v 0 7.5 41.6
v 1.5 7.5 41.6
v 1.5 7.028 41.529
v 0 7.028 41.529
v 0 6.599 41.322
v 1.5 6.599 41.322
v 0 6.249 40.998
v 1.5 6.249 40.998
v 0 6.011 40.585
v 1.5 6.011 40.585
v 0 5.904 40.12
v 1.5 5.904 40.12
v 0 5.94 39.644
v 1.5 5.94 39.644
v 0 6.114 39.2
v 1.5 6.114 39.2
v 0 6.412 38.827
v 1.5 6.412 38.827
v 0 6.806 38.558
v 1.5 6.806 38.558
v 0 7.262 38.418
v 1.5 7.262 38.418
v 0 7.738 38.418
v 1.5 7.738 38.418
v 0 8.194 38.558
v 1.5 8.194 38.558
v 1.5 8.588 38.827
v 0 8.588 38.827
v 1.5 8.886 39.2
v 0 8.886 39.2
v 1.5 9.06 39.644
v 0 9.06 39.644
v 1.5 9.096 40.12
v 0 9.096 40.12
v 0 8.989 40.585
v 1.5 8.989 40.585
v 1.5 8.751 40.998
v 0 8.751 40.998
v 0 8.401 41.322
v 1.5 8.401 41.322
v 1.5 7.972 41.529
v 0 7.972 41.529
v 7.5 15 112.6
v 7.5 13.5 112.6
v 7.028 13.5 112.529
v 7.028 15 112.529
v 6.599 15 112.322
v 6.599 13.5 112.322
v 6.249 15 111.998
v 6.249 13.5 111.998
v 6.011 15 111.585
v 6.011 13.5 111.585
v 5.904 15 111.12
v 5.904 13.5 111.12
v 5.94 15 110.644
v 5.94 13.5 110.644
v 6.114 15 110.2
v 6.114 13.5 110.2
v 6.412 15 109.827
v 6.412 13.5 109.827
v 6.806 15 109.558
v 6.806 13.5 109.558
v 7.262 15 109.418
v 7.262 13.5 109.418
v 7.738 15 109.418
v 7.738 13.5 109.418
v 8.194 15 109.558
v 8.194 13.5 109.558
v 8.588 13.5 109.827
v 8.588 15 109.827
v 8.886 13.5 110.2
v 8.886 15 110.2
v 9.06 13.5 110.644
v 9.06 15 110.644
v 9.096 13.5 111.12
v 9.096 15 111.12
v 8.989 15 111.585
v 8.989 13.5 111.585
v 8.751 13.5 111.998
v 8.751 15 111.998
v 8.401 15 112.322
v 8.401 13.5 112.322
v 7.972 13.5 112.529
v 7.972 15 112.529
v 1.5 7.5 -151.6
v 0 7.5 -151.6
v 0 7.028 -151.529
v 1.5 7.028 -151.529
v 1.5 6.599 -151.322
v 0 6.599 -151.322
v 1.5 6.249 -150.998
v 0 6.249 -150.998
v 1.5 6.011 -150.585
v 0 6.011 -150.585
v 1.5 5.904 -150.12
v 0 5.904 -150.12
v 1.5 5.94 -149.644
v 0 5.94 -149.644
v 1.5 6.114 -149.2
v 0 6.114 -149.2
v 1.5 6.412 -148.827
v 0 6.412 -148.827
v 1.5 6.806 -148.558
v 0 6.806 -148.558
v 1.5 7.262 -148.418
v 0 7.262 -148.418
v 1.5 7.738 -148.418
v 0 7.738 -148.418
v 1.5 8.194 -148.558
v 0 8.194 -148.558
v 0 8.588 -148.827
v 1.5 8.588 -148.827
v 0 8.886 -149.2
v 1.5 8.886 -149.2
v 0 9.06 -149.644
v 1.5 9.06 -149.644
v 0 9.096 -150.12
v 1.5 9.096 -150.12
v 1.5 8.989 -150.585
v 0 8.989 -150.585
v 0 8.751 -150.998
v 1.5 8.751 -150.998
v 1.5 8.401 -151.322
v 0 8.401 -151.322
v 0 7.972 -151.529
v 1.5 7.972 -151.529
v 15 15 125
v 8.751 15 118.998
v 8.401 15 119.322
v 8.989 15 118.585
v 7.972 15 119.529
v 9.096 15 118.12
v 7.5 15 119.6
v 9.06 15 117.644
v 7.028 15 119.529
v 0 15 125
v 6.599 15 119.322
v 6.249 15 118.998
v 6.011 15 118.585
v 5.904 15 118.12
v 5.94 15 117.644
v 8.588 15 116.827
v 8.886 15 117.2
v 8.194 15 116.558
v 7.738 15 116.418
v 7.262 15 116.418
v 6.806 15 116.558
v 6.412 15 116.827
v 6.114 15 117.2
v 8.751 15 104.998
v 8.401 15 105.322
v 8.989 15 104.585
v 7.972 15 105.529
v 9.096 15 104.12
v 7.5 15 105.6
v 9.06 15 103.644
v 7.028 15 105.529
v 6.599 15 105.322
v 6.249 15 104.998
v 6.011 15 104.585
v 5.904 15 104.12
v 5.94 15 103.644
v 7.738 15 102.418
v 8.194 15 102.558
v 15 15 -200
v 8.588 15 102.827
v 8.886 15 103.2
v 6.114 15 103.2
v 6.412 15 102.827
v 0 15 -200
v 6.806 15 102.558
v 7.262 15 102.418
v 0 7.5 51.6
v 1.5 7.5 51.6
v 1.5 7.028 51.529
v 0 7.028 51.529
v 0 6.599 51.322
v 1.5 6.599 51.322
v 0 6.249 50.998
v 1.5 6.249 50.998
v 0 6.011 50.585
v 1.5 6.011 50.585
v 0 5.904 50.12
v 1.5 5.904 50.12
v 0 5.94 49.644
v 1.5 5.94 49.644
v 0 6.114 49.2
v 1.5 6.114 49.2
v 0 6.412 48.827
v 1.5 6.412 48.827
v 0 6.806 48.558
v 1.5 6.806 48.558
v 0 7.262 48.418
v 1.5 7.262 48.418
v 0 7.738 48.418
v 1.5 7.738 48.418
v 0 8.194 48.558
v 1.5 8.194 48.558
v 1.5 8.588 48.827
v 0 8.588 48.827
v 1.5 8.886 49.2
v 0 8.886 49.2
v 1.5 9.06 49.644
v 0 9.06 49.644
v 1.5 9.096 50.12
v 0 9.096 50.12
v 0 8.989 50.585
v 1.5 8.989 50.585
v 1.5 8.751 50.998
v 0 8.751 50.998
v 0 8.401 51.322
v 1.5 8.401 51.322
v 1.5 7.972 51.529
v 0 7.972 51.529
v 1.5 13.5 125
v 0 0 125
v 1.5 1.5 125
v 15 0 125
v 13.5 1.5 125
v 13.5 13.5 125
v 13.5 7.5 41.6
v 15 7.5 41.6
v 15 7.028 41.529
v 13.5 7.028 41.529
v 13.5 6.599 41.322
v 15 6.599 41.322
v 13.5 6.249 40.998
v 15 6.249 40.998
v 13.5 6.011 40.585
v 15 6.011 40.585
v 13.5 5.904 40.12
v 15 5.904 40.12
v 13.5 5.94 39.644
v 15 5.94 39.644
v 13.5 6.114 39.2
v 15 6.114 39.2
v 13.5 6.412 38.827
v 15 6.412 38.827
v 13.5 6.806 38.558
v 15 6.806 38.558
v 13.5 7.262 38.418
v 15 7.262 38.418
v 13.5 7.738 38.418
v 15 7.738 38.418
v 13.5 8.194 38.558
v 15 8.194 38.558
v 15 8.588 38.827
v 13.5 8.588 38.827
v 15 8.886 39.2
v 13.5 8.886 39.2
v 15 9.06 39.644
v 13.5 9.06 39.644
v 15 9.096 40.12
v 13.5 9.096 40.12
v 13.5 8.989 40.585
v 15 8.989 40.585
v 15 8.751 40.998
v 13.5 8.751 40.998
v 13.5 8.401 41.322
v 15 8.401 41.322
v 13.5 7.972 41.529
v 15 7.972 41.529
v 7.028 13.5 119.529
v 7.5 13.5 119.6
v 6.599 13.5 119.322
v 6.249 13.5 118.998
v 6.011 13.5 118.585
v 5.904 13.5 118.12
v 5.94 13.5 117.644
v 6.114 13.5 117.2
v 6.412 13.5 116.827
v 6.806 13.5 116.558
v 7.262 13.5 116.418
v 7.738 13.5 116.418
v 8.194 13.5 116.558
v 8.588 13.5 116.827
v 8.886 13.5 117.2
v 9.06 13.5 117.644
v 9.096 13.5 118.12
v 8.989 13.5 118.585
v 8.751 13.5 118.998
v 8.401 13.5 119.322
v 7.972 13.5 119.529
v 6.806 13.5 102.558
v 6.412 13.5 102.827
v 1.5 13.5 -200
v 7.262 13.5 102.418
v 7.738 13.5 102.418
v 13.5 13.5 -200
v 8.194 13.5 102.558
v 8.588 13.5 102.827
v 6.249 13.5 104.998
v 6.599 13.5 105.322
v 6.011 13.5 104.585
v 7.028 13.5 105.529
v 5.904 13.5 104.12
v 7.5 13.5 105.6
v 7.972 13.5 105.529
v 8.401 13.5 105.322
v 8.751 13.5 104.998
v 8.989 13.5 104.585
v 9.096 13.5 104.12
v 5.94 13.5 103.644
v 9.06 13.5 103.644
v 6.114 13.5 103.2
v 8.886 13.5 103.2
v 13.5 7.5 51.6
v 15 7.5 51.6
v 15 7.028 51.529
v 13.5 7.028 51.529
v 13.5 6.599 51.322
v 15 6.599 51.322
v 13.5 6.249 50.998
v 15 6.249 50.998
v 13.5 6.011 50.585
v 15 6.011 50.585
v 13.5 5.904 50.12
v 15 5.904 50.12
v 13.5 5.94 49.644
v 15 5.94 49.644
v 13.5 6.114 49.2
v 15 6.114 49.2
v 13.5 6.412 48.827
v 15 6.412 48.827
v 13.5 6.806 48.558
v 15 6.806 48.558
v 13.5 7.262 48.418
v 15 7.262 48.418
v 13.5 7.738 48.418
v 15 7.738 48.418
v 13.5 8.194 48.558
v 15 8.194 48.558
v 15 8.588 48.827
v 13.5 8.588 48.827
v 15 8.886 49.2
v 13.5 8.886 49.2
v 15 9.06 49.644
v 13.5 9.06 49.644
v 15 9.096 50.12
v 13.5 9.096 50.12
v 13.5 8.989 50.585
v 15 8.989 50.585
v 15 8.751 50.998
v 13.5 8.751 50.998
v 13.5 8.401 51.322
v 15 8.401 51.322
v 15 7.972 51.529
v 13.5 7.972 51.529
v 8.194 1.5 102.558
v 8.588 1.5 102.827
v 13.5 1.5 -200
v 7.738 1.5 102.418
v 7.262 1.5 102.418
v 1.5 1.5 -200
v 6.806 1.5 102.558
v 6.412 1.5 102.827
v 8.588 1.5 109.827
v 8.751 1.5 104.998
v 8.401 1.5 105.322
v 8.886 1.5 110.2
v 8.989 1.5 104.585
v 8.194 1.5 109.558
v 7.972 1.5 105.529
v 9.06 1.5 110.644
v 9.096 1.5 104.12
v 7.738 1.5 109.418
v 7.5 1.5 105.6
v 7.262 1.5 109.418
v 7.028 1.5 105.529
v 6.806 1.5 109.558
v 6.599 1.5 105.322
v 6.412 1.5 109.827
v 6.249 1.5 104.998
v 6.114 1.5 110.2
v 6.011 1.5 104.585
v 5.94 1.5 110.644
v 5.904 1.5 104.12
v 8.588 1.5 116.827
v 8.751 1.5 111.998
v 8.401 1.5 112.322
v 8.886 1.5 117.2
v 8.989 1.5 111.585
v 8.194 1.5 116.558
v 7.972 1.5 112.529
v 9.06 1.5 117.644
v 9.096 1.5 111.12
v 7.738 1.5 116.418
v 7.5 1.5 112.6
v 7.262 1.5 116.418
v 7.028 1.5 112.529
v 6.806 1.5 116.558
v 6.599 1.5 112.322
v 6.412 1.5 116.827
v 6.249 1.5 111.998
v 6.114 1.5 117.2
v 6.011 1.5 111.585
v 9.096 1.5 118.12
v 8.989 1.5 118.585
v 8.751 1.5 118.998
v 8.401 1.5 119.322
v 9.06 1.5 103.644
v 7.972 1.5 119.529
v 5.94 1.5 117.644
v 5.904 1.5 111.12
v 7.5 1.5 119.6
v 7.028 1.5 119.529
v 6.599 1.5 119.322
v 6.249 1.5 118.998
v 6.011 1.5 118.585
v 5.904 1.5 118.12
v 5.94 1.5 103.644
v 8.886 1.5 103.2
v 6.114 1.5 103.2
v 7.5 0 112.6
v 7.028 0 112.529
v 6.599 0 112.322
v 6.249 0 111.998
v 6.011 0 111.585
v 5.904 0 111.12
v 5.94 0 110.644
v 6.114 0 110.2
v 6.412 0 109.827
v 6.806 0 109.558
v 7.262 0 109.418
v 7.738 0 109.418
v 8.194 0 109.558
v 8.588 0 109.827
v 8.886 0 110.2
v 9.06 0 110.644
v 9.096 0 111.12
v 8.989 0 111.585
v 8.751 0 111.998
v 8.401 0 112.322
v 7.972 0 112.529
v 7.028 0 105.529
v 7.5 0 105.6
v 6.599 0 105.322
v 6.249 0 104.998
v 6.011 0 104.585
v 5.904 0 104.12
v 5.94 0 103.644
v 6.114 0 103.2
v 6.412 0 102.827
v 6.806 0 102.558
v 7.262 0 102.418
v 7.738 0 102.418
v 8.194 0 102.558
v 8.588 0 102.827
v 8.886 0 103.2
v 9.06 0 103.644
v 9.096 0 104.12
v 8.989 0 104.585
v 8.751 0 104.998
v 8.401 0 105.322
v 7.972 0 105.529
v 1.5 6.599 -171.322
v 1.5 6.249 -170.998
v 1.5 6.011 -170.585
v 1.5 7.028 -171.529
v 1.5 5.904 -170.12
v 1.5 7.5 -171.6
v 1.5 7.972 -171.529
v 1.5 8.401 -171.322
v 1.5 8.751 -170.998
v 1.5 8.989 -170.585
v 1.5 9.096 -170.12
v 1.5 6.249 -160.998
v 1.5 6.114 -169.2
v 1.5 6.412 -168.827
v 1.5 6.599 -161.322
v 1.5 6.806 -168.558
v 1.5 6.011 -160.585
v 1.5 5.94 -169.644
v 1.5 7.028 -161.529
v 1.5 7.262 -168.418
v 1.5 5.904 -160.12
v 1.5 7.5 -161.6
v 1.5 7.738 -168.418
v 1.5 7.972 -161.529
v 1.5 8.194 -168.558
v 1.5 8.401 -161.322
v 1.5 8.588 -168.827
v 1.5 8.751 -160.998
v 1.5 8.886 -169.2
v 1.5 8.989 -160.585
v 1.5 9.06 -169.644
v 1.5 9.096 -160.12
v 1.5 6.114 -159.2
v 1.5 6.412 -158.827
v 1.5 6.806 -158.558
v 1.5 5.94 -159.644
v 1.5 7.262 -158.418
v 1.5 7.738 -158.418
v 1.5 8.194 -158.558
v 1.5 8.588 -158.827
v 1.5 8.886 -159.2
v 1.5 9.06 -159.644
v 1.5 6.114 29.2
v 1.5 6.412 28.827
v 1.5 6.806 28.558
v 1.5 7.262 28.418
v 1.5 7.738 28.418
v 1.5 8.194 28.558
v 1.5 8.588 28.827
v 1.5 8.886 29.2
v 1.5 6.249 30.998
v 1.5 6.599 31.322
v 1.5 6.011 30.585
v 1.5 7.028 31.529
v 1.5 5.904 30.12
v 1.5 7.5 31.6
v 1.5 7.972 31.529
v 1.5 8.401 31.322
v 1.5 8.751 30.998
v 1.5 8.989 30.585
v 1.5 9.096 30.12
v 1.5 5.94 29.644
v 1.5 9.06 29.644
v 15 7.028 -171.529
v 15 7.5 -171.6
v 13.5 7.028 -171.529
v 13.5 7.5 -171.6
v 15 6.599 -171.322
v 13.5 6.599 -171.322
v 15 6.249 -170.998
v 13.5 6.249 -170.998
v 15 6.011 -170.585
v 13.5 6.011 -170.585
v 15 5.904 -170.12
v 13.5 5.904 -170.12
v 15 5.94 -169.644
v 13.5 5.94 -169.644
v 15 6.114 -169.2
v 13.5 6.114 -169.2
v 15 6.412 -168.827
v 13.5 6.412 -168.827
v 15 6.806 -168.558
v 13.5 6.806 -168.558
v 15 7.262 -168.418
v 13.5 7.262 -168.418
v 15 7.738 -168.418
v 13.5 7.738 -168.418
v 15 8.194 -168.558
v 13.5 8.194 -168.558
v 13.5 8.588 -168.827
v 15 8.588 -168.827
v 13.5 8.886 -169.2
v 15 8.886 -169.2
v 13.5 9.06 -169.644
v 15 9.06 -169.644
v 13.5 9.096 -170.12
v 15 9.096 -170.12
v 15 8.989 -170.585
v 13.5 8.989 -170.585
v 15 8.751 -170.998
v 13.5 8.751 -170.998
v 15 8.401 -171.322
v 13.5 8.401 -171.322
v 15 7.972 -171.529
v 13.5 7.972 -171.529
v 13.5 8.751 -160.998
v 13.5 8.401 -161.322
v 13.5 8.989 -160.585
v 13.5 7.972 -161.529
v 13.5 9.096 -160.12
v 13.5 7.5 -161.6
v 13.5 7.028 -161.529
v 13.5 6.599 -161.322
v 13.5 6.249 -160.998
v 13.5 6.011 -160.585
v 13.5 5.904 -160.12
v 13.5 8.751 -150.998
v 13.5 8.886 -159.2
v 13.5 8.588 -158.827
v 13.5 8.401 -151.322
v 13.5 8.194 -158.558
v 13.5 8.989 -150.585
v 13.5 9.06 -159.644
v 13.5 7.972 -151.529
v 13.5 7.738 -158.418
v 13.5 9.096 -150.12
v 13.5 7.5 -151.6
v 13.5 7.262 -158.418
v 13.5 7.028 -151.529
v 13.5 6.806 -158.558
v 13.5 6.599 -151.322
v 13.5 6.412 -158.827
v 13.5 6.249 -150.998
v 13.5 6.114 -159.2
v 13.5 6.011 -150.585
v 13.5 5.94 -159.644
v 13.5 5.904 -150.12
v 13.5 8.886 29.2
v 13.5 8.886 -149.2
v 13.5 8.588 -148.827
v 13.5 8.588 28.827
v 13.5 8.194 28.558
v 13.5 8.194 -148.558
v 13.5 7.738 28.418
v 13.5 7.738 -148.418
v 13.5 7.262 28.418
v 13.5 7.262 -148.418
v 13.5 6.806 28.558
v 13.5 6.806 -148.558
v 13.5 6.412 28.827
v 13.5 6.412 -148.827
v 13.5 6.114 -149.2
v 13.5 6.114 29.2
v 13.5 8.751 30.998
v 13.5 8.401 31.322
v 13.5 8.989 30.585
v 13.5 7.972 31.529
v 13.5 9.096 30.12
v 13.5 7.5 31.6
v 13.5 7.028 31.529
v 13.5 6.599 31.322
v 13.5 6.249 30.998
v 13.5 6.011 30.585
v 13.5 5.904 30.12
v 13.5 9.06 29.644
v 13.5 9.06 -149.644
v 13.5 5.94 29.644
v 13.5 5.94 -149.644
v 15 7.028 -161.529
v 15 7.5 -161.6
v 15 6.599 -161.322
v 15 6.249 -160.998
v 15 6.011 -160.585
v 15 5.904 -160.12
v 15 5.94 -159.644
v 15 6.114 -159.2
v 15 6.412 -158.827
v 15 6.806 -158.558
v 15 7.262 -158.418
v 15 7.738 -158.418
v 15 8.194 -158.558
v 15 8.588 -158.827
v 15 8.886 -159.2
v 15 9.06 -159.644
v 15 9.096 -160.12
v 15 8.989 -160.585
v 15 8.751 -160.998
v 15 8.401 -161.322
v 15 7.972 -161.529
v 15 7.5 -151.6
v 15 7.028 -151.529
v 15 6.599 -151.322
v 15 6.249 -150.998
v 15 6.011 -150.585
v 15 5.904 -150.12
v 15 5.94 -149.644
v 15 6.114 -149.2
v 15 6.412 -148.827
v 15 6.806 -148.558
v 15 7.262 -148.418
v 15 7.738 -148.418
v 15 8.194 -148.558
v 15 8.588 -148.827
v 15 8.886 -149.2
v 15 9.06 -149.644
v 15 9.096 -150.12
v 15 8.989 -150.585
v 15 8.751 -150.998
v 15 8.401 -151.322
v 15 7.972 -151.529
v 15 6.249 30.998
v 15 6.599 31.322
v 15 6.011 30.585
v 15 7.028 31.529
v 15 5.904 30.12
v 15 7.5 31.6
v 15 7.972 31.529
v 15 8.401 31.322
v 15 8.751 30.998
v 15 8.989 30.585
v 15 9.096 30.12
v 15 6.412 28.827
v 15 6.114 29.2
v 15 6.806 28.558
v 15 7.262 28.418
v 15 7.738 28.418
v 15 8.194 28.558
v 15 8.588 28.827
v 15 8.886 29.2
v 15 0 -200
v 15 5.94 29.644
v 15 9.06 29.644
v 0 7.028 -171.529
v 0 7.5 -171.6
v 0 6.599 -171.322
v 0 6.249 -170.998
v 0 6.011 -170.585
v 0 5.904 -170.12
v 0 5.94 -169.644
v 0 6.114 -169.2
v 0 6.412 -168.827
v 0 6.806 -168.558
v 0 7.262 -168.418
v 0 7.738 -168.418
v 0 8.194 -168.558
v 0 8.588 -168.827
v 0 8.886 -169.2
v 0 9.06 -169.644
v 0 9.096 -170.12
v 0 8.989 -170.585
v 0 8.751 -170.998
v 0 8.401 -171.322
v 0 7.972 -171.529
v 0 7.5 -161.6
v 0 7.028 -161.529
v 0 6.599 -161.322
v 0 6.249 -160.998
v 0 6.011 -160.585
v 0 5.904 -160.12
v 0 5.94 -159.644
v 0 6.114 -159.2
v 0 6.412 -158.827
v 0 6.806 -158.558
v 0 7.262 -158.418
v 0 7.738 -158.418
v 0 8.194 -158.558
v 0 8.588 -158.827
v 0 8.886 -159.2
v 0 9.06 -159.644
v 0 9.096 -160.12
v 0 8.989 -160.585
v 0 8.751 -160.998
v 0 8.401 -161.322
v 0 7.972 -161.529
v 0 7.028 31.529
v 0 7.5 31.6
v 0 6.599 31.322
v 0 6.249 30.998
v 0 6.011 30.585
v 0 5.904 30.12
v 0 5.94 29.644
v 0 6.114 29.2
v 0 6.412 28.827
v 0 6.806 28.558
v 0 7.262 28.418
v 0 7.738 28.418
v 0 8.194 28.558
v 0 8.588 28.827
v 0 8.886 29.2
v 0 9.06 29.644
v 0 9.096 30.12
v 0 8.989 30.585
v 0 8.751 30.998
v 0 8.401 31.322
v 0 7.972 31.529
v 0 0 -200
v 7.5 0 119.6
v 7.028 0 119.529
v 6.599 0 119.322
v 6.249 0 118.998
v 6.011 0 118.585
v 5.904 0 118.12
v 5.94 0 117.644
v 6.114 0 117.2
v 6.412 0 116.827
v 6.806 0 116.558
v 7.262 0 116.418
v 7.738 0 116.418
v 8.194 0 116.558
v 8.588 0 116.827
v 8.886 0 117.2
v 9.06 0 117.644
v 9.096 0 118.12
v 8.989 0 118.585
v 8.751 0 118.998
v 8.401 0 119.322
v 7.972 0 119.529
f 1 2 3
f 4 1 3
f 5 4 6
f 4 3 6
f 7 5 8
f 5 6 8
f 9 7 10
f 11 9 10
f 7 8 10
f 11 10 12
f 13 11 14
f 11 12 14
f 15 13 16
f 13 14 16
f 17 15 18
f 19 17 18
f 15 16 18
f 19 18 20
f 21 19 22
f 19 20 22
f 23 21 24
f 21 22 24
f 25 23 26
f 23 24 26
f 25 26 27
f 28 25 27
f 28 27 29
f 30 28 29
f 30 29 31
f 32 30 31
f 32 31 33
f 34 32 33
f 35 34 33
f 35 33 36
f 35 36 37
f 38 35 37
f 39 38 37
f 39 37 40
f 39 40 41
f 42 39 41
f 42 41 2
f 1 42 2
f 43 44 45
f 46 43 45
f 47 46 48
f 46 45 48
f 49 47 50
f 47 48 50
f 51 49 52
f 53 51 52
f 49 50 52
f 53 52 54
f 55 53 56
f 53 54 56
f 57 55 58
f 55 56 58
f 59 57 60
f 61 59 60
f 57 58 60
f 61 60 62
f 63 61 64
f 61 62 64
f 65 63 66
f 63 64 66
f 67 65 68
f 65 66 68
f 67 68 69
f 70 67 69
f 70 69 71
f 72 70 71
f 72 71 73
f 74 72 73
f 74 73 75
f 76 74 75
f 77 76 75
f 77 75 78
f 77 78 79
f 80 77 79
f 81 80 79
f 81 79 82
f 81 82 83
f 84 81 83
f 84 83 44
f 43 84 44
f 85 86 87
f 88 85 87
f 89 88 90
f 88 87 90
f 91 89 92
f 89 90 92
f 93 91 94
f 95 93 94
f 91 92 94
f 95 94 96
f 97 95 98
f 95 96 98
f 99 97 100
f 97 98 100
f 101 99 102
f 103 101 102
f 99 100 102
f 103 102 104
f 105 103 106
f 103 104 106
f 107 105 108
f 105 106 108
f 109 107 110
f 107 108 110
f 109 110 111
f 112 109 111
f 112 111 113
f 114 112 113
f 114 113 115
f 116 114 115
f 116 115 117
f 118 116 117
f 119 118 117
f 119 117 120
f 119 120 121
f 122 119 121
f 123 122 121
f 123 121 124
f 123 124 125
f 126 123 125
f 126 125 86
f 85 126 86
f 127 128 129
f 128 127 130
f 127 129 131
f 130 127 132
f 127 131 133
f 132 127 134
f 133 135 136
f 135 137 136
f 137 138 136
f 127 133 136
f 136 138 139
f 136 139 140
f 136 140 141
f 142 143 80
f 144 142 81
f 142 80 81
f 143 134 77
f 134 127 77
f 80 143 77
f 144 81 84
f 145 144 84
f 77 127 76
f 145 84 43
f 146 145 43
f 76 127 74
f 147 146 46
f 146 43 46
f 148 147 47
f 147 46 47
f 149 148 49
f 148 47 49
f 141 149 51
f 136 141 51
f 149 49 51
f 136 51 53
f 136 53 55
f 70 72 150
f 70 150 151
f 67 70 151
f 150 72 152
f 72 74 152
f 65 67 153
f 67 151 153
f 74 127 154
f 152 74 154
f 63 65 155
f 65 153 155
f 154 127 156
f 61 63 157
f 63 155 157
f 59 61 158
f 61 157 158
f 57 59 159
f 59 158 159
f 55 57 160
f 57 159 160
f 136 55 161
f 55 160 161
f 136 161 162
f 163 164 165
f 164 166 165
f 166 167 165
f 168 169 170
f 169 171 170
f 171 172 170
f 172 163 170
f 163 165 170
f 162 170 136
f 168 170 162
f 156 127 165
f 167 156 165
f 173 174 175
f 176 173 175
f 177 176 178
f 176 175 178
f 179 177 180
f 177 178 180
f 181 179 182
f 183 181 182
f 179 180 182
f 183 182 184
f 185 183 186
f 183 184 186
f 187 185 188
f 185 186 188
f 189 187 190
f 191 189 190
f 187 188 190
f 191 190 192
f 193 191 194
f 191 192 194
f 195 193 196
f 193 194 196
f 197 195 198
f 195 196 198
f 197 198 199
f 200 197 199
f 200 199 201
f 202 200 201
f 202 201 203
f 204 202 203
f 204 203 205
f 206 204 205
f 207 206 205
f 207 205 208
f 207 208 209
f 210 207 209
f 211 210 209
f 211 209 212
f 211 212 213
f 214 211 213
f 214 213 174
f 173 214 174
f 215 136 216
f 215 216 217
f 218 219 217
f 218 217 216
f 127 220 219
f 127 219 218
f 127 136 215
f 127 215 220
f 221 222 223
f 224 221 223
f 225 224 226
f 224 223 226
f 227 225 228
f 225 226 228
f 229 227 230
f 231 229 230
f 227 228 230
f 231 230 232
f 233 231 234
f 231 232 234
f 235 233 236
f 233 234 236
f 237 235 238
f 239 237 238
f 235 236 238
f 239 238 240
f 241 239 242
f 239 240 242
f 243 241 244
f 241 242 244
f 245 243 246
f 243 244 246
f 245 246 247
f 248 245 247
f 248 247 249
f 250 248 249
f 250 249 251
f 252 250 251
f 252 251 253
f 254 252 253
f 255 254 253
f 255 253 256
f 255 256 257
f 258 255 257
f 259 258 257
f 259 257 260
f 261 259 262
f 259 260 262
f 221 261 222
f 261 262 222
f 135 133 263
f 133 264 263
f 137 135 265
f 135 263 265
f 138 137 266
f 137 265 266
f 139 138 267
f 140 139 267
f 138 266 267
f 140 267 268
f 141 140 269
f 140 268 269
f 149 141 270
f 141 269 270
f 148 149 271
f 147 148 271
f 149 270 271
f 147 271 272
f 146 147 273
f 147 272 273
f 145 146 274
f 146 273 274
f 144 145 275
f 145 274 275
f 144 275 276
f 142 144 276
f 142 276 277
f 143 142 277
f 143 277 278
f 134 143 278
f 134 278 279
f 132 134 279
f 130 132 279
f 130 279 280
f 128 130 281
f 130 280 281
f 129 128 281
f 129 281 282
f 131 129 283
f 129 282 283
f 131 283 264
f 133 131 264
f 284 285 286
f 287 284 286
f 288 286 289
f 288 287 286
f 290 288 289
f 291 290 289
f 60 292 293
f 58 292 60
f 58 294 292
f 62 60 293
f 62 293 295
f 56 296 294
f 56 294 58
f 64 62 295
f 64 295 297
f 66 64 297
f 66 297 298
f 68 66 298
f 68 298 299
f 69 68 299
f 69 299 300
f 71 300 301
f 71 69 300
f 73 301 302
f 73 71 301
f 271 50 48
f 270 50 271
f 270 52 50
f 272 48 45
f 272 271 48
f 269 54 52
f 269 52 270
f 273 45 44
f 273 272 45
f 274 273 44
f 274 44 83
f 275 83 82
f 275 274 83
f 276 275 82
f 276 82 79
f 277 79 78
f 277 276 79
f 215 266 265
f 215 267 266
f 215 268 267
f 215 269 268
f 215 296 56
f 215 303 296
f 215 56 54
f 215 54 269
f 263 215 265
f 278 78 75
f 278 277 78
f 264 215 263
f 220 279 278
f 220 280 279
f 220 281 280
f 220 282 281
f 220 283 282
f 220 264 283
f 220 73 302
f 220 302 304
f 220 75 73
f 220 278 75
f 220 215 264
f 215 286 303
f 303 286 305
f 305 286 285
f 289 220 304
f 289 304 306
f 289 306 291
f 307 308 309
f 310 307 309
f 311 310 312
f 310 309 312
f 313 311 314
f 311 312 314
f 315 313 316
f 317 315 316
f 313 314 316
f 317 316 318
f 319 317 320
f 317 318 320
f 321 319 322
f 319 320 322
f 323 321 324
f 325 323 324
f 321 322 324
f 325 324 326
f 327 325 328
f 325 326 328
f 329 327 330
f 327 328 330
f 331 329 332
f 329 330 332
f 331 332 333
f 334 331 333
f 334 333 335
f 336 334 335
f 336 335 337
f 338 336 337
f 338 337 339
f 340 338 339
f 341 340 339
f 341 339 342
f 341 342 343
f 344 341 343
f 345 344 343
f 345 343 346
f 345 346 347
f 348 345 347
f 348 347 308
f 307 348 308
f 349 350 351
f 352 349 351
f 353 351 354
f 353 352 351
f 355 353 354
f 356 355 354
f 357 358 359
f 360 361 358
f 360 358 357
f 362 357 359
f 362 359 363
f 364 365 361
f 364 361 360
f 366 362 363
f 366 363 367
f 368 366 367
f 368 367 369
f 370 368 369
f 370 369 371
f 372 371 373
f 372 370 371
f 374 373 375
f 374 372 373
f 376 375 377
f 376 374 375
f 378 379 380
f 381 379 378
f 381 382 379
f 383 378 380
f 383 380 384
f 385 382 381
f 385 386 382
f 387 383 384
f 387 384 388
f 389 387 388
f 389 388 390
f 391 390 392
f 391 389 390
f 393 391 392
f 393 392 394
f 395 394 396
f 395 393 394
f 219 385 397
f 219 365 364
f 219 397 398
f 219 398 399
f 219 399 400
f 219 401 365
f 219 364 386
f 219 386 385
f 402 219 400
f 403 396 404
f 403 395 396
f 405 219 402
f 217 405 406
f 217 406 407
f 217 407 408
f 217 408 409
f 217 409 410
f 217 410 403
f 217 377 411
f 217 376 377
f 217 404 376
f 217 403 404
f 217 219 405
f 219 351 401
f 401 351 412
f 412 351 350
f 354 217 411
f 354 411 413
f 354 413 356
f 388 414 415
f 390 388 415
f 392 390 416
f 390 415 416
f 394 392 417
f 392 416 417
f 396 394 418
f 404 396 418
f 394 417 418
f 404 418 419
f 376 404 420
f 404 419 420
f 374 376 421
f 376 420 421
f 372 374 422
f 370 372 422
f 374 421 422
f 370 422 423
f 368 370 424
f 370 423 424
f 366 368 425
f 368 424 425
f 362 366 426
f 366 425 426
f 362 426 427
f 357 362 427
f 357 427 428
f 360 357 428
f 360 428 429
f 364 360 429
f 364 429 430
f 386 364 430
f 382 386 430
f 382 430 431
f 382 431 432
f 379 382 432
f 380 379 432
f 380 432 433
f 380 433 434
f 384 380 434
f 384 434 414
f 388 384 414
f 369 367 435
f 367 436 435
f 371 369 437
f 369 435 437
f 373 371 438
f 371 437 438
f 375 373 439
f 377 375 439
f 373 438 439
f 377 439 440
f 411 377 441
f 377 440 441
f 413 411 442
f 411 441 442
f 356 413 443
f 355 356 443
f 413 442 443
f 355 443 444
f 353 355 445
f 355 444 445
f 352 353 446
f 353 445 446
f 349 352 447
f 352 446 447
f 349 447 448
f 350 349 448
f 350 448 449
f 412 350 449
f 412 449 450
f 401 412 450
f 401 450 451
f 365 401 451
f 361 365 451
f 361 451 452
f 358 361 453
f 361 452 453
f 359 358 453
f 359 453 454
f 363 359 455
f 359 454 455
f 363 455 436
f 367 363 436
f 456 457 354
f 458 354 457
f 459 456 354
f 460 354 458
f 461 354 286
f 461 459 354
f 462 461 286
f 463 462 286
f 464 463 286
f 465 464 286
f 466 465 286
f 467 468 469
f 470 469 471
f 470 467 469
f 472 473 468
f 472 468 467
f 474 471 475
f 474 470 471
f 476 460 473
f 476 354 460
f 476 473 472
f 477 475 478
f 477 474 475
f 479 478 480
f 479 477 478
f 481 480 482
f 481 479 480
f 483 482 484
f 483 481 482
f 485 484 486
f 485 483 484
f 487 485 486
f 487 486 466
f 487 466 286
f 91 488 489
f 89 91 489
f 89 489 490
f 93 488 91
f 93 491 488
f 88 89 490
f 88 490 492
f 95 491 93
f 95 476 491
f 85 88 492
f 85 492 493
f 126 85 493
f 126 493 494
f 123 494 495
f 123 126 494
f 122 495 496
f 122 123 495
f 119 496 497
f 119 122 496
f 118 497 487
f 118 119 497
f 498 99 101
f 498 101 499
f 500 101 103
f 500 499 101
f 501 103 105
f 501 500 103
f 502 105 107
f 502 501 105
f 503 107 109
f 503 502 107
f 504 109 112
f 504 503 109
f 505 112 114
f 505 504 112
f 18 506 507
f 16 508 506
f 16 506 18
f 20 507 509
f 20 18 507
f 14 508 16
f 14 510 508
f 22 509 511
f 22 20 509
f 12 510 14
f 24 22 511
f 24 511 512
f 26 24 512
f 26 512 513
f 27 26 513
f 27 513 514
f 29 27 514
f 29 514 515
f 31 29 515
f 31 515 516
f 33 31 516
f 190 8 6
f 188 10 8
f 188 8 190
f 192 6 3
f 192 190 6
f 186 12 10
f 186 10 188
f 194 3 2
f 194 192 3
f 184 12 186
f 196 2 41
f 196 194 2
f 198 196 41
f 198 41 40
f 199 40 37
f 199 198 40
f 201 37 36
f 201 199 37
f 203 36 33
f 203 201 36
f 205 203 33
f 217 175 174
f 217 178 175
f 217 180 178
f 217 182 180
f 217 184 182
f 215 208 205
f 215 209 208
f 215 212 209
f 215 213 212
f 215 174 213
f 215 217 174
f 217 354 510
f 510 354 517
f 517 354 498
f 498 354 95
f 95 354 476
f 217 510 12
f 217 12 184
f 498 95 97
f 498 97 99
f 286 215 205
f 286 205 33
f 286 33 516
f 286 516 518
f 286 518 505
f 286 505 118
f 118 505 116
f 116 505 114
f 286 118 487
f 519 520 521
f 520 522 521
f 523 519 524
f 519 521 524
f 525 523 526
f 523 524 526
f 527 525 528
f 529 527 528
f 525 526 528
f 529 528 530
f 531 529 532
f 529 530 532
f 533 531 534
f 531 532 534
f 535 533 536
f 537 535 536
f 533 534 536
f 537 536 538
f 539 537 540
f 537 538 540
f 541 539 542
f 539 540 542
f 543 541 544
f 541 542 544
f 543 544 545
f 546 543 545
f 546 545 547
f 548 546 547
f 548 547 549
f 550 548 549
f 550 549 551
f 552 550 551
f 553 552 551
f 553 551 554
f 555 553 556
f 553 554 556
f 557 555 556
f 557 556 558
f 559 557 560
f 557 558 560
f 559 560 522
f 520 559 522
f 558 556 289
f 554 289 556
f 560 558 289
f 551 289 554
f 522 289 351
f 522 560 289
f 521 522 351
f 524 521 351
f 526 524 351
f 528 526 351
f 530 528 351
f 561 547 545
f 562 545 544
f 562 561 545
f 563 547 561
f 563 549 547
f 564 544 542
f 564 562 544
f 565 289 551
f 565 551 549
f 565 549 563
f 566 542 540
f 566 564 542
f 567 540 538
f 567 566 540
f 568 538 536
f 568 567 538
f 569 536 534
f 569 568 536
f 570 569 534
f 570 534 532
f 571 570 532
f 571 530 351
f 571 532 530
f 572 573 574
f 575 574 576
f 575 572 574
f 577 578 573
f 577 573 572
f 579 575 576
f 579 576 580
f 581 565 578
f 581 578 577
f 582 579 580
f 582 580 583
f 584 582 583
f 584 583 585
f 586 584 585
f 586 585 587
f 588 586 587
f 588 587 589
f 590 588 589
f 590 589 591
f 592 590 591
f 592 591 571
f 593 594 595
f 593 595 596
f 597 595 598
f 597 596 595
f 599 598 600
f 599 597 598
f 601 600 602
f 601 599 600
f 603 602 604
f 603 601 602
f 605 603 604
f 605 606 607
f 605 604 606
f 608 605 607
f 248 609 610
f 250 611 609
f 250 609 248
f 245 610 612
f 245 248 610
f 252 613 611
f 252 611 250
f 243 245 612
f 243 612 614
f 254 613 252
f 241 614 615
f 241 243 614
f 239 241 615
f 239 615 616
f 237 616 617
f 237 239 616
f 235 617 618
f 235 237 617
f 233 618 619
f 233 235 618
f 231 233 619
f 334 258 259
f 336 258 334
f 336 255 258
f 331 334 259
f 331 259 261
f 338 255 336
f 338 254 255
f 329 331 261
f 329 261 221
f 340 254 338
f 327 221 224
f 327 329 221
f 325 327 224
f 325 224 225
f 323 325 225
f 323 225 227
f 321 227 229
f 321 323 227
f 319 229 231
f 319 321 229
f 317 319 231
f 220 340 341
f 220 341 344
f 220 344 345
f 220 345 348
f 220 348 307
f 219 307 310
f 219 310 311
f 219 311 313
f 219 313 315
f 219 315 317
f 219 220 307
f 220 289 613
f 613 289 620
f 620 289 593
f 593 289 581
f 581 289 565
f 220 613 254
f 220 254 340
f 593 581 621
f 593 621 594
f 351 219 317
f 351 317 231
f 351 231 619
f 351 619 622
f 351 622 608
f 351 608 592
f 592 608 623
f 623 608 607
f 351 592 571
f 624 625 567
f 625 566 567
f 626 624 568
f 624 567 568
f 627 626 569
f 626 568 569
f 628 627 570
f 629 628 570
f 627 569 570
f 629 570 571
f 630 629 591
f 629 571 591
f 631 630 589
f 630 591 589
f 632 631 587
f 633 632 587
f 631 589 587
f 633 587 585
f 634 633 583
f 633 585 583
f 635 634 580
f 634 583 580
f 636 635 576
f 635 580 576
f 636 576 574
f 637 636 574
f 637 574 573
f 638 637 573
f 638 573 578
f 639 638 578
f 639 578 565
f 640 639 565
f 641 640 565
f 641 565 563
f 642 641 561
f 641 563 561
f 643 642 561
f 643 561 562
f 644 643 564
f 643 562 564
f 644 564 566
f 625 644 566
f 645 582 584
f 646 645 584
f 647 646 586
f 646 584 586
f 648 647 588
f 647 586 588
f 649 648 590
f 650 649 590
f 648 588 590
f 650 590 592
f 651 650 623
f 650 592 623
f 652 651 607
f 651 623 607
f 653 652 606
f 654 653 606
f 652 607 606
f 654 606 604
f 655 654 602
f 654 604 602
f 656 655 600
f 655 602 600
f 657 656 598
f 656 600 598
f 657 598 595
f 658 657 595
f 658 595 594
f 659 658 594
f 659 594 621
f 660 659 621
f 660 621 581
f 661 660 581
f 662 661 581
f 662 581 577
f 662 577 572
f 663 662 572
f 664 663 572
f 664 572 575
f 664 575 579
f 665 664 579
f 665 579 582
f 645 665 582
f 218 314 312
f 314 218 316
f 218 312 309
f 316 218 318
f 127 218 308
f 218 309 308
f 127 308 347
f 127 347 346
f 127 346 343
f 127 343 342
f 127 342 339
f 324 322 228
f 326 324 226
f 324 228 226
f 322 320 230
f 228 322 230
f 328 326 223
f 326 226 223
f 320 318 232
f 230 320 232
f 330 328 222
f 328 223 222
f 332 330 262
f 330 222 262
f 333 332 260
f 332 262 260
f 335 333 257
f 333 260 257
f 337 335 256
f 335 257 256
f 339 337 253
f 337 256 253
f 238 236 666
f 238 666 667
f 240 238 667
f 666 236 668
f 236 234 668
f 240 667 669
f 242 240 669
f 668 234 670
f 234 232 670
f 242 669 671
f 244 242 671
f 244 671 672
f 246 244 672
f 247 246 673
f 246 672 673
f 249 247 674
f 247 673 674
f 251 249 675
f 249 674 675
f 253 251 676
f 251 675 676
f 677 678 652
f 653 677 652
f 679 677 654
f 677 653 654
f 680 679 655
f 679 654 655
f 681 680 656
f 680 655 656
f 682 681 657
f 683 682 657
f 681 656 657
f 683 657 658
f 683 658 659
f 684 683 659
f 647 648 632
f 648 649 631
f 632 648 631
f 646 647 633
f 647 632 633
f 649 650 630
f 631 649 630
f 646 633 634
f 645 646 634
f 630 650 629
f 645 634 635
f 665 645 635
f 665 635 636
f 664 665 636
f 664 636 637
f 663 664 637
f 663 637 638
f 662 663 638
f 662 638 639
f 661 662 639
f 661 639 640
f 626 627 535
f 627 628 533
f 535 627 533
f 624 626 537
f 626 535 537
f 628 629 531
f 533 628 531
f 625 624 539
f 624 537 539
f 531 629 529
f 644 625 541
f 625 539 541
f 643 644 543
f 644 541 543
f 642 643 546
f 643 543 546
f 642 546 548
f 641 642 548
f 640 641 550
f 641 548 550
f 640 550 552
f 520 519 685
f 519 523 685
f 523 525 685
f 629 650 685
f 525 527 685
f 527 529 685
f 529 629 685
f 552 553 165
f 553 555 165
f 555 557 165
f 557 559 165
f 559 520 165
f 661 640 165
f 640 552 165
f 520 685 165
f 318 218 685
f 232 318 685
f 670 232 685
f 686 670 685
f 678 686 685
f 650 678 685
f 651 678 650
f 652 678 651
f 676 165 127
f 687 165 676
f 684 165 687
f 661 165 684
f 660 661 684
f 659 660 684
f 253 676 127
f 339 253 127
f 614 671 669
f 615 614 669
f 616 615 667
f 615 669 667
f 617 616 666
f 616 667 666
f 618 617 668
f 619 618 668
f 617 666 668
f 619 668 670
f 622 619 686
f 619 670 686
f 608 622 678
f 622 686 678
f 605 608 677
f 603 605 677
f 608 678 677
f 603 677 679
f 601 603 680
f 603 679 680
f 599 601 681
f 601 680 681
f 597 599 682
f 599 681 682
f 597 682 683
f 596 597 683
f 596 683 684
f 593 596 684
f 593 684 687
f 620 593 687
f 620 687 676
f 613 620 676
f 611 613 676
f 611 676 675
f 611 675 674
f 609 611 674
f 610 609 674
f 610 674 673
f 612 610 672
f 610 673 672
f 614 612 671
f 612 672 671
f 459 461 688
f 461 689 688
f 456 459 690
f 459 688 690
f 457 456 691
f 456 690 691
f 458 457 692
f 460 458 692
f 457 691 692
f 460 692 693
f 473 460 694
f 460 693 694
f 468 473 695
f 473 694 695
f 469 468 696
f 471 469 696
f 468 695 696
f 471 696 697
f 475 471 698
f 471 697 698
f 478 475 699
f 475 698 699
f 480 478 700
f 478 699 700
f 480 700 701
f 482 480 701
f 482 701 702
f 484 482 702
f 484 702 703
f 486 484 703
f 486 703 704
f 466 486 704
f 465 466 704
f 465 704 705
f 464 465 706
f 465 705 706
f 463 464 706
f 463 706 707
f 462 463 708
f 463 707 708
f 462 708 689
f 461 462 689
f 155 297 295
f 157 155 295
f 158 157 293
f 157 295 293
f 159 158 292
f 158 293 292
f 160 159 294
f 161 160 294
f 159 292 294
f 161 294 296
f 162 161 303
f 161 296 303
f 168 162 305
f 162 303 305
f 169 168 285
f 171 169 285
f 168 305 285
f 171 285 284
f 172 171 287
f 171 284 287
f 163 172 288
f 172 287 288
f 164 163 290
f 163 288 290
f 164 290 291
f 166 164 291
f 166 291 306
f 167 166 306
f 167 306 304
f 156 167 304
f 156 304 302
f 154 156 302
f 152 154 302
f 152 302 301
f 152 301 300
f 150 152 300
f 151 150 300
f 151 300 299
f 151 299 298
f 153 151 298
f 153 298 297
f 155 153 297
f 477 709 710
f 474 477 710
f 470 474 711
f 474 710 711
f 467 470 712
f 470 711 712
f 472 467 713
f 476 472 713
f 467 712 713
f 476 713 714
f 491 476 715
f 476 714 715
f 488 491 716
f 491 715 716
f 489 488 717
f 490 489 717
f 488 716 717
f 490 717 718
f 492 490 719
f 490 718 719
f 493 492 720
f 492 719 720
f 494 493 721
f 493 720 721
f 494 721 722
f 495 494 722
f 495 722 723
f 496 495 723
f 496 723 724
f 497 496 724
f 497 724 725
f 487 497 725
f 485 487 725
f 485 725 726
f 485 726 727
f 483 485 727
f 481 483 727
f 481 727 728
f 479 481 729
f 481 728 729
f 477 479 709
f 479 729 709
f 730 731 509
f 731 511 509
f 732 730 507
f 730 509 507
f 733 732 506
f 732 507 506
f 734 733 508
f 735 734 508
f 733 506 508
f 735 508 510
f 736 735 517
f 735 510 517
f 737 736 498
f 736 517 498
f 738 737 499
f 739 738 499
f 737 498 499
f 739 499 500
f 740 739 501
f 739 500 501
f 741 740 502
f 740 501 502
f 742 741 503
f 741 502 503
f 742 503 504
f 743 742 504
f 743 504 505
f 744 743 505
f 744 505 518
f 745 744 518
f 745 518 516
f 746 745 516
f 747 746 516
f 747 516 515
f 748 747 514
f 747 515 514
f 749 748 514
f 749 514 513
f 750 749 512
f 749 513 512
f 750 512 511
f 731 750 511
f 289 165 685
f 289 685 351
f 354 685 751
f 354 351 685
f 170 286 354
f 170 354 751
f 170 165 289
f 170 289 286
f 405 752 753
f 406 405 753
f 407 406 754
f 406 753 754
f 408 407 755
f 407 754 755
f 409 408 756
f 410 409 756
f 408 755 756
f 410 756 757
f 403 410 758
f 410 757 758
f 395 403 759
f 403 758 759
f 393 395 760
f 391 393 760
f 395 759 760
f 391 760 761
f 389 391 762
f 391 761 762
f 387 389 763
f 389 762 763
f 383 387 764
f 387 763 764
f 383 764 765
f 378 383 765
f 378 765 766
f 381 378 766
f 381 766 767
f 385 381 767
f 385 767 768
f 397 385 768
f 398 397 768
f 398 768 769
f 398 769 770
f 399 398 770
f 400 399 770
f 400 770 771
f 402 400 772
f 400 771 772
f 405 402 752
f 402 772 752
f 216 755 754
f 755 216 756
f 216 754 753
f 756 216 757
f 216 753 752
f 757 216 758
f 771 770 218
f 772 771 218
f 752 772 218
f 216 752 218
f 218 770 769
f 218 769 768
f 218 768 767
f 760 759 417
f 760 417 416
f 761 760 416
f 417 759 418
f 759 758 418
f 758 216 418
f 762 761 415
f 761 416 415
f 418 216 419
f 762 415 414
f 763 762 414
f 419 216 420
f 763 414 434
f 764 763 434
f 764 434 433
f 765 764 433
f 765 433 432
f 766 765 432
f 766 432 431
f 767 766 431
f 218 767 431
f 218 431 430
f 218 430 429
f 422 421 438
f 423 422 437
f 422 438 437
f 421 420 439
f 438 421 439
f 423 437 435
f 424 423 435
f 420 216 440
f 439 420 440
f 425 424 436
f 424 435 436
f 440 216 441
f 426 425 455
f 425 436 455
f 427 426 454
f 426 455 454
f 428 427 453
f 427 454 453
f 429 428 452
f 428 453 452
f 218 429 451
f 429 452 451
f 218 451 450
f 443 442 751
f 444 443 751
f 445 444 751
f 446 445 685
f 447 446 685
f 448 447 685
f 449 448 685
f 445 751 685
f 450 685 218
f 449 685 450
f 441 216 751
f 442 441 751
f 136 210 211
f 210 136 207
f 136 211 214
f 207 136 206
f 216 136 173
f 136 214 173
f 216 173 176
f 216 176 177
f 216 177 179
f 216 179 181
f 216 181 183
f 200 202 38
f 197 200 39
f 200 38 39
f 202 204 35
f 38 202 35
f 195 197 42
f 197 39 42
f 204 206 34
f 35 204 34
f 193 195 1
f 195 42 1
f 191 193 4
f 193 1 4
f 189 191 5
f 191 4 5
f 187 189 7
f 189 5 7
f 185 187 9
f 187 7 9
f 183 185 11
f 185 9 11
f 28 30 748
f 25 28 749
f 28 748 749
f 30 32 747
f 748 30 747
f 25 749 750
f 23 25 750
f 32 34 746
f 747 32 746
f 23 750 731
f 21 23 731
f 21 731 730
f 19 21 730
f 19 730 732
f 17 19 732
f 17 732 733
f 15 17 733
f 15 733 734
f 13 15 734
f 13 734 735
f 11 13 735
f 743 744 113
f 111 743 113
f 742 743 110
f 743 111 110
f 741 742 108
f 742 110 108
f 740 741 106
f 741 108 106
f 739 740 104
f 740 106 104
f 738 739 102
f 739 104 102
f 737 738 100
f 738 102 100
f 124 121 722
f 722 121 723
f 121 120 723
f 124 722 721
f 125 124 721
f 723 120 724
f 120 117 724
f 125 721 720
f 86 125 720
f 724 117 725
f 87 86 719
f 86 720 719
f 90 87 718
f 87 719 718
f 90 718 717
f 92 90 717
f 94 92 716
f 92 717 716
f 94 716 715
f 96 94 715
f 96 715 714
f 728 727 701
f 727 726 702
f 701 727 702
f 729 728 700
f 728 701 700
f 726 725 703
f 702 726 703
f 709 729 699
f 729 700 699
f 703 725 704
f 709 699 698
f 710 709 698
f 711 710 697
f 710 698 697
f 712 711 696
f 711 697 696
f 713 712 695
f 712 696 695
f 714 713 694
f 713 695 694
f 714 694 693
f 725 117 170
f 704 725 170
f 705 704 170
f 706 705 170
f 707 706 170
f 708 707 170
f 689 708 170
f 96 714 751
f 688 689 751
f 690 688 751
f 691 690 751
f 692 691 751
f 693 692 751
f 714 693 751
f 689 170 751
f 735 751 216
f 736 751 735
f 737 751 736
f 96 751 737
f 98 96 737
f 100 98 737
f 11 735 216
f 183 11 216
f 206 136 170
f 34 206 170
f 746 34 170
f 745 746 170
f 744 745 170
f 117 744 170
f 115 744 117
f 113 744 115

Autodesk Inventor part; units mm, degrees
ref_plane "YZ Plane" through (0, 0, 0) normal (1, 0, 0) x (0, 1, 0)
ref_plane "XZ Plane" through (0, 0, 0) normal (0, 1, 0) x (-1, 0, 0)
ref_plane "XY Plane" through (0, 0, 0) normal (0, 0, 1) x (1, 0, 0)
sketch "スケッチ1" plane through (0, 0, 0) normal (0, 0, 1) x (1, 0, 0)
  line L0 (0, 0) -> (15, 0)
  line L1 (15, 0) -> (15, 15)
  line L2 (15, 15) -> (0, 15)
  line L3 (0, 15) -> (0, 0)
  dimension "d0" = 15
  dimension "d1" = 15
extrude "押し出し1" add sketch "スケッチ1" along normal blind 140
sketch "スケッチ3" plane through (0, 0, 0) normal (0, 0, -1) x (-1, 0, 0)
  line L0 (0, 0) -> (-15, 0)
  line L1 (-15, 0) -> (-15, 15)
  line L2 (-15, 15) -> (0, 15)
  line L3 (0, 15) -> (0, 0)
  dimension "d18" = 15
  dimension "d19" = 15
extrude "押し出し2" add sketch "スケッチ3" along normal blind 200
sketch "スケッチ4" plane through (0, 0, -200) normal (0, 0, -1) x (-1, 0, 0)
  point P0 (0, 0)
sketch "スケッチ6" plane through (0, 0, 140) normal (0, 0, 1) x (1, 0, 0)
  line L0 (0, 0) -> (0, 15) projected
  line L1 (15, 15) -> (15, 0) projected
  line L2 (0, 0) -> (15, 0)
  line L3 (15, 0) -> (15, 15)
  line L4 (15, 15) -> (0, 15)
  line L5 (0, 15) -> (0, 0)
extrude "押し出し3" cut sketch "スケッチ6" against normal blind 15
sketch "スケッチ7" plane through (0, 0, 125) normal (0, 0, 1) x (1, 0, 0)
  point P0 (0, 0)
  point P1 (0, 0)
sketch "スケッチ8" plane through (0, 0, -200) normal (-1, 0, 0) x (0, 0, 1)
  circle A0 centre (240, 7.5) radius 1.6
  line L0 (0, 15) -> (325, 15) projected
  line L1 (325, 0) -> (325, 15) projected
  point P0 (200, 0)
  dimension "d34" = 3.2
  dimension "d35" = 7.5
  dimension "d36" = 85
hole "穴3" at (0, 7.5, 40) direction (1, 0, 0) diameter 3.2 end through all
sketch "スケッチ9" plane through (0, 0, -200) normal (-1, 0, 0) x (0, 0, 1)
  circle A0 centre (250, 7.5) radius 1.6
  line L0 (0, 0) -> (325, 0) projected
  line L1 (325, 0) -> (325, 15) projected
  circle A1 centre (230, 7.5) radius 1.6
  point P0 (200, 0)
  dimension "d44" = 3.2
  dimension "d45" = 7.5
  dimension "d46" = 75
  dimension "d47" = 3.2
  dimension "d48" = 7.5
  dimension "d49" = 20
hole "穴4" at (0, 7.5, 30) at (0, 7.5, 50) direction (1, 0, 0) diameter 3.2 end through all
sketch "スケッチ10" plane through (0, 15, -200) normal (0, 1, 0) x (1, 0, 0)
  circle A0 centre (7.5, -318) radius 1.6
  line L0 (0, 0) -> (0, -325) projected
  line L1 (0, -325) -> (15, -325) projected
  circle A1 centre (7.5, -311) radius 1.6
  circle A2 centre (7.5, -304) radius 1.6
  point P0 (0, -200)
  dimension "d57" = 3.2
  dimension "d58" = 7.5
  dimension "d59" = 7
  dimension "d60" = 3.2
  dimension "d61" = 3.2
  dimension "d62" = 7
  dimension "d63" = 7
hole "穴5" at (7.5, 15, 104) at (7.5, 15, 111) at (7.5, 15, 118) direction (0, -1, 0) diameter 3.2 end through all
sketch "スケッチ11" plane through (15, 0, -200) normal (1, 0, 0) x (0, 0, -1)
  line L0 (0, 15) -> (0, 0) projected
  line L1 (-325, 0) -> (0, 0) projected
  point P0 (-200, 0)
  point P1 (-30, 7.5)
  point P2 (-40, 7.5)
  point P3 (-50, 7.5)
  dimension "d71" = 30
  dimension "d72" = 7.5
  dimension "d73" = 10
  dimension "d74" = 10
hole "穴6" at (15, 7.5, -150) at (15, 7.5, -160) at (15, 7.5, -170) direction (-1, 0, 0) diameter 3.2 end through all
sketch "スケッチ12" plane through (0, 0, 125) normal (0, 0, 1) x (1, 0, 0)
  line L0 (1.5, 13.5) -> (13.5, 13.5)
  line L1 (13.5, 13.5) -> (13.5, 1.5)
  line L2 (13.5, 1.5) -> (1.5, 1.5)
  line L3 (1.5, 1.5) -> (1.5, 13.5)
  line L4 (0, 15) -> (15, 15) projected
  line L5 (0, 0) -> (0, 15) projected
  dimension "d82" = 12
  dimension "d83" = 12
  dimension "d84" = 1.5
  dimension "d85" = 1.5
extrude "押し出し4" cut sketch "スケッチ12" against normal blind 450
sketch "スケッチ13" plane through (0, 15, -200) normal (0, 1, 0) x (1, 0, 0)
  point P0 (0, -200)
properties part number "射出_角柱5" material "アルミニウム 6061"
